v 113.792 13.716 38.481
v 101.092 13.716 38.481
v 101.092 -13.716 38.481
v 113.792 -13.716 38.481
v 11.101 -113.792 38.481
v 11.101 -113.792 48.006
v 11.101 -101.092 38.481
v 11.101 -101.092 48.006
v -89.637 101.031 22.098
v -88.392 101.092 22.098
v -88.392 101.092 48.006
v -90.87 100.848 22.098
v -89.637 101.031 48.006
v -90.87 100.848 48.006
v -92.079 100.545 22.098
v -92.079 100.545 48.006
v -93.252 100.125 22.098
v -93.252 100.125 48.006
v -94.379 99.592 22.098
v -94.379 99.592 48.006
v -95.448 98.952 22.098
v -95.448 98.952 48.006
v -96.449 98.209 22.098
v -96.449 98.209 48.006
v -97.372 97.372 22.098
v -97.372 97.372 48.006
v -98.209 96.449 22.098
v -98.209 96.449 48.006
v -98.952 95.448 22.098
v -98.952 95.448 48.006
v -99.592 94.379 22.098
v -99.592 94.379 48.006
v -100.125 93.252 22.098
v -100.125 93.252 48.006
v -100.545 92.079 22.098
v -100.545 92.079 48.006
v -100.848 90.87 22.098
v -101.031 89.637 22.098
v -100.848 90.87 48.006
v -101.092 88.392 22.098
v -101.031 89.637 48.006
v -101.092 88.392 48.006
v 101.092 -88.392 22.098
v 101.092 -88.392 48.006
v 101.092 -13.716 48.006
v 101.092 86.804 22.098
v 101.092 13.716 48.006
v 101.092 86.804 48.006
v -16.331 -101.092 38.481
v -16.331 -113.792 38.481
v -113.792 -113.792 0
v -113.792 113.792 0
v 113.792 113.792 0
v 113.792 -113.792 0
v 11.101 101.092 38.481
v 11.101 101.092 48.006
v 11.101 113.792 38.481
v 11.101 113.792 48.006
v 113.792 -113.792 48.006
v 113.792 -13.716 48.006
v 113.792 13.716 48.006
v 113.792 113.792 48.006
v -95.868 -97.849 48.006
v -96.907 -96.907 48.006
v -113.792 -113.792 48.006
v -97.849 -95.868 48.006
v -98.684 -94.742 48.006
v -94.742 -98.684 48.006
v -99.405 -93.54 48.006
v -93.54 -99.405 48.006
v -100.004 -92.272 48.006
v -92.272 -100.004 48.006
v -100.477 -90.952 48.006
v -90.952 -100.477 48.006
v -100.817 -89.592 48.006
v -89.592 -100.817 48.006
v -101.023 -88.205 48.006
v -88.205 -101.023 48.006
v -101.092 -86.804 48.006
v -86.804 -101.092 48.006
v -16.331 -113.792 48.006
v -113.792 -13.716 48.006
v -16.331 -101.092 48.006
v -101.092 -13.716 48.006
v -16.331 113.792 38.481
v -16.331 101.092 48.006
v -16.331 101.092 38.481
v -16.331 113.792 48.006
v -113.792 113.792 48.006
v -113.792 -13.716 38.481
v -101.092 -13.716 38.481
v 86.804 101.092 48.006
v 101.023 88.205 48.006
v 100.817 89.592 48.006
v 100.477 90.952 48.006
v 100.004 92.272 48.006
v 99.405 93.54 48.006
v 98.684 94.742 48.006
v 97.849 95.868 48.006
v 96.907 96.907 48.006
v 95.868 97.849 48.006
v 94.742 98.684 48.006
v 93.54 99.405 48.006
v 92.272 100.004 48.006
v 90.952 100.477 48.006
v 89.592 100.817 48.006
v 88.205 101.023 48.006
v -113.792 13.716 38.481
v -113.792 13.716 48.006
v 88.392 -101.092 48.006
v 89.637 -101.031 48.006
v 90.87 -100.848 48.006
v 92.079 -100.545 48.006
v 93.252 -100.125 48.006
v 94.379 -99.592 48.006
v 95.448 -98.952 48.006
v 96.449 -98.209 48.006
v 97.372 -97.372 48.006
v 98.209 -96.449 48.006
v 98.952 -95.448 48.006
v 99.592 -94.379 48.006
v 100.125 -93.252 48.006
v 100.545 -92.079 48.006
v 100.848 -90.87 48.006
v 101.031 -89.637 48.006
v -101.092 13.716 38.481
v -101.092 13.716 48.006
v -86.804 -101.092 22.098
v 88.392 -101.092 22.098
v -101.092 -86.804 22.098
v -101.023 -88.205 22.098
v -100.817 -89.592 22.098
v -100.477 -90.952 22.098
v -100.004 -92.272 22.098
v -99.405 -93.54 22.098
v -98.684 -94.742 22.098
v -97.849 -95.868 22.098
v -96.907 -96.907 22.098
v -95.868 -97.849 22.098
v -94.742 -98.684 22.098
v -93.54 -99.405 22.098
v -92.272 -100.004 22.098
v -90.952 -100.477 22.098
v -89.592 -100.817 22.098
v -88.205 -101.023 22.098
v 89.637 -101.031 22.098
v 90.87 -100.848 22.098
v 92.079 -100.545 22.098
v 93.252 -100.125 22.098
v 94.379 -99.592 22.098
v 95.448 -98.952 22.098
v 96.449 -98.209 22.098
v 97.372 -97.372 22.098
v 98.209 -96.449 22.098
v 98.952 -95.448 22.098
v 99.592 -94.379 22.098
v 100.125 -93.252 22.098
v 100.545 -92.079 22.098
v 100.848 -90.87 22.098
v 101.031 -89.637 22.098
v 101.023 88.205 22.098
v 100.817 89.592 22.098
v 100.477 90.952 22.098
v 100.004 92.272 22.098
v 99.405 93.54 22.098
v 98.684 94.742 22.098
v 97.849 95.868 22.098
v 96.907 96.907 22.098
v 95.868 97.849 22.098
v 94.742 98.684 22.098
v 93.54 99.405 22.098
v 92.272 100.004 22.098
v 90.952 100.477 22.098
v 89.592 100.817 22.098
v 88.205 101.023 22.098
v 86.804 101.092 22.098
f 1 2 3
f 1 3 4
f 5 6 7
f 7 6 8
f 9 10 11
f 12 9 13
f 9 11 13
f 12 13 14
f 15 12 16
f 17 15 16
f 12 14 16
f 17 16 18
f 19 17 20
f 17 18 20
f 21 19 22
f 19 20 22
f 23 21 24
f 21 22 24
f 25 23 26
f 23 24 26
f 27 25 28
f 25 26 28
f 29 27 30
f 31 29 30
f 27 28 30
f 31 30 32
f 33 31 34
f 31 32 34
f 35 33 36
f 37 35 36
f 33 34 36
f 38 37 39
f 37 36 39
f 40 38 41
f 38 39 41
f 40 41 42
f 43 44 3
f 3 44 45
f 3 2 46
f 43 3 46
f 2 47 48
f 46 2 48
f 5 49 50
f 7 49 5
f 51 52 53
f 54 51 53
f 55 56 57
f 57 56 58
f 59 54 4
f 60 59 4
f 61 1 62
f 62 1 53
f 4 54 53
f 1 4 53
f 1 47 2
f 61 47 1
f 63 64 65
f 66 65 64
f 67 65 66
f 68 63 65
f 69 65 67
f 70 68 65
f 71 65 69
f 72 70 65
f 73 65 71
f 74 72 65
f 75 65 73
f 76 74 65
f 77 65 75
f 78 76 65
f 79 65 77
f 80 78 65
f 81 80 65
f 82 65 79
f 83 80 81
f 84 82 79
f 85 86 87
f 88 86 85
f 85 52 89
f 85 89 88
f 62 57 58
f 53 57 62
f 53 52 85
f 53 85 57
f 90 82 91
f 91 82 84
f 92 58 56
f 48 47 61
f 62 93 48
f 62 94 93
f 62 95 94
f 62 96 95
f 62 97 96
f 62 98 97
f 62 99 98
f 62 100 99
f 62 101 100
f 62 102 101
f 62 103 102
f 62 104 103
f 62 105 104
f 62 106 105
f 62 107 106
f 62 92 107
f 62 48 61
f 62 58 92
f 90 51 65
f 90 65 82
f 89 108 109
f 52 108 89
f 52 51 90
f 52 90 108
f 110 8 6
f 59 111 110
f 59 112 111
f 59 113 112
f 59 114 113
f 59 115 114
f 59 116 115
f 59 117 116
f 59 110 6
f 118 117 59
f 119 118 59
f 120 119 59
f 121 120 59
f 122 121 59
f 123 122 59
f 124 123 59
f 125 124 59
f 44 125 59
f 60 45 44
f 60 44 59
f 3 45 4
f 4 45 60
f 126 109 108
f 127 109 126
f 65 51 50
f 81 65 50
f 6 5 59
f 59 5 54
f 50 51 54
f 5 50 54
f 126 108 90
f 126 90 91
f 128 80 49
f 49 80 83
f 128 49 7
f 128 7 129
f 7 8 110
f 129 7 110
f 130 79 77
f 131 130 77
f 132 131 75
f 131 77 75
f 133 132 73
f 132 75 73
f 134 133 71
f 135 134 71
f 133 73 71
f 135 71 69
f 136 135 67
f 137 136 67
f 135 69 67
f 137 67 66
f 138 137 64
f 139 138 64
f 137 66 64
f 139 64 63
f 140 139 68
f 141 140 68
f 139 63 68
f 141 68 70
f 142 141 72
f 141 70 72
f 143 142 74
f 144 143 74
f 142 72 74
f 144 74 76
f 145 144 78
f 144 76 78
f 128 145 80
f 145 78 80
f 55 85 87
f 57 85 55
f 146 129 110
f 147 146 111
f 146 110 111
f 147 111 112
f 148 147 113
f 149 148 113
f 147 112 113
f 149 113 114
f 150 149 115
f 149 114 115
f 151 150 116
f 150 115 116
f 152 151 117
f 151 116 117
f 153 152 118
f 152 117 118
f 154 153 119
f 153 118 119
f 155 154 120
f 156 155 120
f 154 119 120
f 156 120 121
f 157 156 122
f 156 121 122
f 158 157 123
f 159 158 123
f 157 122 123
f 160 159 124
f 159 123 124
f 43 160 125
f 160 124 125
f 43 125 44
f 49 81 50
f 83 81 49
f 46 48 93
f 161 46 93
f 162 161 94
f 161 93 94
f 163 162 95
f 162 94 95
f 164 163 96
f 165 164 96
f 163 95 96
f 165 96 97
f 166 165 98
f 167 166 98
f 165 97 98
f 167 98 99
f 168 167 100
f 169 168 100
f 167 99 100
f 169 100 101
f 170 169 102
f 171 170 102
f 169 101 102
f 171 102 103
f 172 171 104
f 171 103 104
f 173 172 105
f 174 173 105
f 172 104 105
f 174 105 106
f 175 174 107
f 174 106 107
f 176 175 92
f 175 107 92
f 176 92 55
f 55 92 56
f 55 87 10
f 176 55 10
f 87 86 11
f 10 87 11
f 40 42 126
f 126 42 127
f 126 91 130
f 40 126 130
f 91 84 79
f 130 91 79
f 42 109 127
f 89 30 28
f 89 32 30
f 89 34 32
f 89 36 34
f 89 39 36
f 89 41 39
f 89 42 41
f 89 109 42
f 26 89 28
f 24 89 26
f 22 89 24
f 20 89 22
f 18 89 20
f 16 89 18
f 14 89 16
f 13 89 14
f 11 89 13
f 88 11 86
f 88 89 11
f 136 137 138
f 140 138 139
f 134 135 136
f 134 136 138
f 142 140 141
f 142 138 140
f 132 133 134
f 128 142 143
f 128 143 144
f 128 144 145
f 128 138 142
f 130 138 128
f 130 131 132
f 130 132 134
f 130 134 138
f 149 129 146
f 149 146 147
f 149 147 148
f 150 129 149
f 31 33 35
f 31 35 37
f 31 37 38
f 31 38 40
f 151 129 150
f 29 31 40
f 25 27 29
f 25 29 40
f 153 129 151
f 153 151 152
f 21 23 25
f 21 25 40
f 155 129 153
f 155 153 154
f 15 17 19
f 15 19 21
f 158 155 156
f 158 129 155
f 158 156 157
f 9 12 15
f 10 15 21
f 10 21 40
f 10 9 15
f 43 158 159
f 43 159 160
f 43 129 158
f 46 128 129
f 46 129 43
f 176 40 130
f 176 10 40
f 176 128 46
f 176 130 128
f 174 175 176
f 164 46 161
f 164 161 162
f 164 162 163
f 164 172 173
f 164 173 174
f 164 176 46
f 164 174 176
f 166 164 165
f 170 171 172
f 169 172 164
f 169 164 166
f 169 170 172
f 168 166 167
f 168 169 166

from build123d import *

# Parameters (mm, degrees)
F0_W     = 227.584
F0_H     = 227.584
F1_DEPTH = 48.006
F3_DEPTH = 25.908
F4_W     = 12.7
F4_H     = 27.432
F4_W_2   = 27.432
F4_H_2   = 12.7
F4_H_3   = 13.716
F5_DEPTH = 9.525


with BuildPart() as f1:
    # F0 (on Top) → F1 (new body)
    with BuildSketch(Plane.XY):
        Rectangle(F0_W, F0_H)
    extrude(amount=F1_DEPTH)

    # F2 (on face) → F3 (cut)
    with BuildSketch(Plane.XY.offset(48.006)):
        with BuildLine():
            Line((86.8045, 101.092), (-88.392, 101.092))
            ThreePointArc((-88.392, 101.092), (-97.372256, 97.372256), (-101.092, 88.392))
            Line((-101.092, 88.392), (-101.092, -86.8045))
            ThreePointArc((-101.092, -86.8045), (-96.907288, -96.907288), (-86.8045, -101.092))
            Line((-86.8045, -101.092), (88.392, -101.092))
            ThreePointArc((88.392, -101.092), (97.372256, -97.372256), (101.092, -88.392))
            Line((101.092, -88.392), (101.092, 86.8045))
            ThreePointArc((101.092, 86.8045), (96.907288, 96.907288), (86.8045, 101.092))
        make_face()
    extrude(amount=-F3_DEPTH, mode=Mode.SUBTRACT)

    # F4 (on face) → F5 (cut)
    with BuildSketch(Plane.XY.offset(48.006)):
        with Locations((-107.442, 0)):
            Rectangle(F4_W, F4_H)
        with Locations((-2.614738, 107.442)):
            Rectangle(F4_W_2, F4_H_2)
        with Locations((107.442, 6.858)):
            Rectangle(F4_W, F4_H_3)
        with Locations((107.442, -6.858)):
            Rectangle(F4_W, F4_H_3)
        with Locations((-2.614738, -107.442)):
            Rectangle(F4_W_2, F4_H_2)
    extrude(amount=-F5_DEPTH, mode=Mode.SUBTRACT)


solid = f1.part
